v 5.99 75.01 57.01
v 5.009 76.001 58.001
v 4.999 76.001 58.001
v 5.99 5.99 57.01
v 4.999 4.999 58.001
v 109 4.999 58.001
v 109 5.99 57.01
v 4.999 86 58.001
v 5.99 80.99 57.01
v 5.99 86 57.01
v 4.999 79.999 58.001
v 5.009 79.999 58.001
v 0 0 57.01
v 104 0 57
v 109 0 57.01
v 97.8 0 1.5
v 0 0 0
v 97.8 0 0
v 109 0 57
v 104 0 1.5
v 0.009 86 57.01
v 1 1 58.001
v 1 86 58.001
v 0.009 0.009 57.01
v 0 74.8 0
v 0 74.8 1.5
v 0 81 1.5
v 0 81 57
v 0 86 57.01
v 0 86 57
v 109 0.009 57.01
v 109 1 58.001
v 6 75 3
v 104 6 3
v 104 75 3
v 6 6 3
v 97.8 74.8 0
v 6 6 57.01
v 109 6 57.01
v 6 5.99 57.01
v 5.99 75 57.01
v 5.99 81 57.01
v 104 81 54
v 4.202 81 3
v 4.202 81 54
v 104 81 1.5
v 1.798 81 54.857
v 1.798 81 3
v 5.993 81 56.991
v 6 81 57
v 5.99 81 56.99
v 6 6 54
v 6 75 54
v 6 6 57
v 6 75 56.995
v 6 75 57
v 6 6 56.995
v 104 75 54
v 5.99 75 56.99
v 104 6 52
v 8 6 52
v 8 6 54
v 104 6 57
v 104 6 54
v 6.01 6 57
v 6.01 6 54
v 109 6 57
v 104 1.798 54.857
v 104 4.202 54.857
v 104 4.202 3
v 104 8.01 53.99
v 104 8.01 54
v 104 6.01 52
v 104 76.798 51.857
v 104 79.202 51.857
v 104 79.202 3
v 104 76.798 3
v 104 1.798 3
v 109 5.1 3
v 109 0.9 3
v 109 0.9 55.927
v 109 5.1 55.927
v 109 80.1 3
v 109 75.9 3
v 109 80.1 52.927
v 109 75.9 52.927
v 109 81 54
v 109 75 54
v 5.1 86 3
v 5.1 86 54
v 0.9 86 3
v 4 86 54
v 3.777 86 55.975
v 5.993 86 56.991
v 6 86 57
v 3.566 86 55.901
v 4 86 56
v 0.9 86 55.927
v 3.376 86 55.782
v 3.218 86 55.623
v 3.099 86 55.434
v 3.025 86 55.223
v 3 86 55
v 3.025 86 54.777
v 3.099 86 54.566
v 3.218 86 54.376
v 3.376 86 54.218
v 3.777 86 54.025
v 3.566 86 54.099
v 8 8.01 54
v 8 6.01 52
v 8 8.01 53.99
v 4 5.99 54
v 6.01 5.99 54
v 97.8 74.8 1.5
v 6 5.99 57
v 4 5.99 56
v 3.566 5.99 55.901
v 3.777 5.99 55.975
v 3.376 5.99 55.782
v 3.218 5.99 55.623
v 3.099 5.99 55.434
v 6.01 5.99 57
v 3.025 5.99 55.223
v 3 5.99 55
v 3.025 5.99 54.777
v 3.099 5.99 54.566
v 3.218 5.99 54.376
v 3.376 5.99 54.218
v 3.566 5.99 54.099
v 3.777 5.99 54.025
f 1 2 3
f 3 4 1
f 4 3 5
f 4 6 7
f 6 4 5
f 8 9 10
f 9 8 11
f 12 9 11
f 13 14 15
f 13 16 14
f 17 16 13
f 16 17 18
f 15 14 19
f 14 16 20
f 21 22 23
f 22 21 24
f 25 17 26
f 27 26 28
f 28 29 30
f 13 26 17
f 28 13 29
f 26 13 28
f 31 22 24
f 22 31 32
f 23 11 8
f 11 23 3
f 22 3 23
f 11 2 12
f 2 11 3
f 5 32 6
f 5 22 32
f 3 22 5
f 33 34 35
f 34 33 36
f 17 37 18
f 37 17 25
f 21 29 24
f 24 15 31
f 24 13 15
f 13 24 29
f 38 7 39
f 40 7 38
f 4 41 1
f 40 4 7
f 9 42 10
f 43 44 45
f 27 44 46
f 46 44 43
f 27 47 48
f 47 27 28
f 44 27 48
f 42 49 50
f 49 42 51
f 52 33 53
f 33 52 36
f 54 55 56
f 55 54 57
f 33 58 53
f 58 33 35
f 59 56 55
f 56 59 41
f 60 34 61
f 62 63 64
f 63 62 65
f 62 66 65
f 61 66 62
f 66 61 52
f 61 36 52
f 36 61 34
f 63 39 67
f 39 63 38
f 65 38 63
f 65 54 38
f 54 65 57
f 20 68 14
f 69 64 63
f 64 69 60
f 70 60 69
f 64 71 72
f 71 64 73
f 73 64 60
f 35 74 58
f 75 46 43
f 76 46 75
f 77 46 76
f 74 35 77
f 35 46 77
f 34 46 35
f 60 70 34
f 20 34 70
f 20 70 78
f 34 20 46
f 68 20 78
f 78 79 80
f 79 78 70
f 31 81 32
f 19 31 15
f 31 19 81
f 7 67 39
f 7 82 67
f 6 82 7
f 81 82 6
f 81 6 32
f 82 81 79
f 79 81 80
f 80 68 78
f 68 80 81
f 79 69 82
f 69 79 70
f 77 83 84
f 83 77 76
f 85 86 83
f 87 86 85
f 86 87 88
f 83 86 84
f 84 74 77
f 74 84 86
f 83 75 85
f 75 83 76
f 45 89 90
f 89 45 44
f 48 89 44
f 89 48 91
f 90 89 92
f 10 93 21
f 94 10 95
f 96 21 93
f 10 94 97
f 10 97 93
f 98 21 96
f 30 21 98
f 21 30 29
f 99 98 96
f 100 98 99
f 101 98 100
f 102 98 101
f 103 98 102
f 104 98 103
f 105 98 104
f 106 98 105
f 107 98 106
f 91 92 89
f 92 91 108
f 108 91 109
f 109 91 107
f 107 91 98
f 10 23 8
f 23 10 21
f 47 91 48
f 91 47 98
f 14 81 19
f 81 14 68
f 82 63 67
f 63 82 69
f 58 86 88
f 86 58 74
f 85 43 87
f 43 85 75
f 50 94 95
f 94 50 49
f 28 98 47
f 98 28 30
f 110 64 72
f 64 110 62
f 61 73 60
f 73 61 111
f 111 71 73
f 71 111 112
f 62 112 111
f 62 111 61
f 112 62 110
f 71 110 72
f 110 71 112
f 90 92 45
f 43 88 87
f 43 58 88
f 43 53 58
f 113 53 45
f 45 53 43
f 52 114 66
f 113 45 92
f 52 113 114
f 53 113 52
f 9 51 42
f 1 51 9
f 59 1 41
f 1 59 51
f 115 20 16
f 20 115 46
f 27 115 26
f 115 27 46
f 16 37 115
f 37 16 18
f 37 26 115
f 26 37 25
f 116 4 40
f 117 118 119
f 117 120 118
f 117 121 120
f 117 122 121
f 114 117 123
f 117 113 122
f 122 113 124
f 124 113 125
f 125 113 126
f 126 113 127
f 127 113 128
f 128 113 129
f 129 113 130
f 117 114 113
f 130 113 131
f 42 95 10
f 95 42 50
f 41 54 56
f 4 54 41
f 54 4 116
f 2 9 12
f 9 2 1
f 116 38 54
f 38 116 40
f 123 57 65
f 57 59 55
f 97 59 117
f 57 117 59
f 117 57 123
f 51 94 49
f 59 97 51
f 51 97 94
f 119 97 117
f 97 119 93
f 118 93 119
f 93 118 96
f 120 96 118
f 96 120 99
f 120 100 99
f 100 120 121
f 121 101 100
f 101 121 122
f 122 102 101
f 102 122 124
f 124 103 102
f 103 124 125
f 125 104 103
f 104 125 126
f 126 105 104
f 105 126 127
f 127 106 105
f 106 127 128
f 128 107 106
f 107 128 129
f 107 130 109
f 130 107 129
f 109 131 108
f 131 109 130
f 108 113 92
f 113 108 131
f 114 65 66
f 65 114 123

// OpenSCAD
// ============================================================================
// cutlery_box.scad
// Graduated 3-chamber disposable-cutlery box (Option 3) — CUT-FROM-SOLID port
// of build_box.py, for a 120 x 120 x 120 mm printer (AOSEED).
//
// WHY THIS PORT EXISTS (the whole point):
//   The hand-mesh generator (build_box.py) could not keep the 1 mm rim chamfer
//   continuous across the female dovetail joints, because where a slot's flared
//   corner crosses the sloped chamfer it needs a true boolean intersection.
//   OpenSCAD HAS that boolean kernel, so here we do exactly the "cut-from-solid"
//   thing:
//      1. Build the ENTIRE box as ONE solid, WITH the chamfer already on it.
//      2. difference() out vertical dovetail prisms ( /_\ cross-section ),
//         running from just above the base plate up THROUGH the rim, to both
//         (a) form the sliding-dovetail joints, and
//         (b) split the box into 6 bed-sized pieces.
//   Because the cut is a real boolean through the already-chamfered solid, the
//   sloped chamfer<->slot edge is produced for free => the rim chamfer stays
//   CONTINUOUS across every joint, with none of the sliver hacks.
//
// ----------------------------------------------------------------------------
// HOW TO USE
//   In the app:  set `part` below (or use the Customizer dropdown), F5 to
//                preview, F6 to render, then File > Export > STL.
//   One piece (CLI):
//      openscad -o body_knife_A.stl -D 'part="knife_A"' cutlery_box.scad
//   ALL SIX (bash, run from this folder):
//      for p in knife_A knife_B fork_A fork_B spoon_A spoon_B; do \
//        openscad -o "body_$p.stl" -D "part=\"$p\"" cutlery_box.scad ; done
//   PNG preview of one piece:
//      openscad -o knife_B.png --imgsize=1400,1000 --autocenter --viewall \
//        -D 'part="knife_B"' cutlery_box.scad
//
//   Pieces are modelled in ASSEMBLED coordinates (floor-down, z=0 is the bed),
//   so importing all six STLs together shows the assembled box directly; your
//   slicer will auto-drop each one onto the plate for printing.
//
// BED SANITY: every piece is <= 120 mm in X, Y, Z.
//   Z = 58 mm. Widest piece = spoon at 117 mm (Y). A-halves reach 109 mm (X,
//   including the protruding dovetail key). All under 120.
//
// !! I could NOT run OpenSCAD to verify this file (no binary in my sandbox) !!
//   - The rim chamfer is a SMOOTH, true-45 bevel built from hull() frustums of
//     convex rectangles. Works in every OpenSCAD since ~2015 (incl. Homebrew
//     2021.01). No stepped staircase -- and, crucially, it makes box() a clean
//     well-formed solid so the per-part booleans resolve reliably (the old
//     14-slice staircase was fragile and CGAL was dropping the walls of the
//     interior parts, leaving only the key prisms => "floating boxes").
//   - roof() is still available behind USE_ROOF=true for those who have it
//     (2021.01+ snapshots); for THIS rectangular design it is identical, so it
//     is NOT required.
//   - After F6, check the console for "WARNING"/"not a valid 2-manifold".
//     If a tenon ever looks detached, bump EPS to 0.05.
// ============================================================================


/* [Part to render / export] */
part = "knife_A"; // [knife_A, knife_B, fork_A, fork_B, spoon_A, spoon_B, assembly]

/* [Chamfer method] */
// false = smooth hull() frustum bevel (default, any OpenSCAD); true = roof() (2021.01+)
USE_ROOF = false;

/* [Heights (mm)] */
BASE   = 3.0;     // floor / base-plate thickness
COMP_H = 55.0;    // interior wall height above the floor (cutlery stack depth)

/* [Walls (mm)] */
HOST_T   = 6.0;     // thickness of every wall (thick enough to host a dovetail)
HALF_LEN = 104.0;   // printed length of each half (A = near, B = far); <120 incl. key

/* [Chamber bays (mm)] */
N_COL     = 3;       // columns of cutlery per chamber
KNIFE_COL = 23.0;    // -> knife bay 69  (3 x 19 mm knives + play)
FORK_COL  = 33.0;    // -> fork  bay 99  (3 x 29 mm forks  + play)
SPOON_COL = 37.0;    // -> spoon bay 111 (3 x 34 mm spoons + play, trimmed <120)

/* [Dovetail joint (mm)] */
DT_DEPTH = 5.0;   // tail protrusion past the seam (male key depth)
DT_NECK  = 1.2;   // half-width at the seam face (narrow)
DT_FLARE = 2.1;   // half-width at the tip (wide -> locks)
DT_CLR   = 0.4;   // FLANK/seam slide clearance added to the female socket (do not change for fit)
DT_DEPTH_RELIEF = 0.3; // extra depth on the socket BACK only, so the tail tip never bottoms out

/* [Hidden-dovetail top cap / "hat" (mm)] */
// The dovetail otherwise shows its trapezoid outline on the TOP edge of the wall.
// To hide it, the MALE piece extends the wall's full-width top (chamfer included)
// across the key footprint -> a flush, continuous top. The FEMALE piece gets a
// matching top RECESS (cap footprint + CAP_CLR) so the cap drops straight in.
// Result: the top reads as one surface with a single straight seam line at the cap
// tip; the dovetail joinery lives entirely below the cap.
//
// SELF-SUPPORTING UNDERSIDE: the cap reaches the FULL wall width at the chamfer base
// (so the top edge reads as the wall extended, with NO recessed sliver on the outer
// face), and its underside is ONE planar ramp from the chamfer's OUTER CORNER
// (half-width HOST_T/2 at z = BODY_H-CHAMFER) down to the dovetail-neck half-width
// (CAP_FOOT) at CAP_SLANT_DEG from horizontal. No little horizontal step. The ramp
// reaching full width exactly at the chamfer base means "ramp top" == "chamfer base"
// (CAP_H is DERIVED). The FEMALE recess is the same ramp + CAP_CLR play.
// TRADEOFF: because the cap runs all the way to the outer corner, the female wall
// tapers to ~0 at z = BODY_H-CHAMFER -> a thin feather edge at the joint (gradual at
// CAP_SLANT_DEG, hidden inside the joint when assembled). Accepted per design intent.
CAP_SLANT_DEG = 50;     // cap underside ramp angle from horizontal (50 = self-supporting, long flare)
CAP_FOOT = DT_NECK;     // cap-underside half-width where it meets the dovetail neck
CAP_CLR = 0.3;          // slide clearance so the male cap seats into the female top recess

/* [Rim chamfer (mm)] */
CHAMFER = 1.0;    // 45-deg comfort break broken along the top wall edges

/* [Base half-lap / anti-warp (mm)] */
// Neighbouring base plates overlap as a HORIZONTAL half-lap (shiplap) at mid-base
// height, so corners stay coplanar (no lift/protrusion). Horizontal lap faces do
// NOT bind the vertical-drop assembly. Shingle direction: A->B and knife->fork->spoon.
LAP_LEN = 6;        // overlap past the A/B seam and the knife/fork seam
LAP_LEN_FS = 2;     // overlap past the fork/SPOON seam -- SMALLER: spoon is the
                    // tightest piece (117mm of the 120mm bed); a 6mm lap there
                    // would push spoon to 123mm. 2mm keeps spoon at 119mm.
LAP_Z   = BASE/2;   // 1.5 -- horizontal split height of the lap (bottom vs top half)
LAP_CLR = 0.2;      // in-plane clearance so the shelf isn't a press fit

/* [Lid — box features that receive a flat ORDERED clear sheet] */
// The lid itself is NOT printed: it's a flat ~2 mm PETG/Tritan sheet, bullnose-polished
// edges (r=LID_EDGE_R), ordered to size. We only model the box features that receive it.
LID_T            = 2.0;   // ordered sheet thickness
LID_EDGE_R       = 1.0;   // ordered sheet bullnose edge radius (for the sheet order spec)
LID_PLAY         = 0.4;   // total vertical play in the hinge groove (sheet + this)
LID_RECESS       = 2.0;   // lid TOP sits this far BELOW the rim, so the journal pocket is fully
                          // capped (rim caps the bullnose -> retains the lid when raised; tilt-in)
HINGE_AT_MINUS_X = true;  // hinge on the -x (303mm) end wall; clip on +x. (flip = mirror; default delivered)
// perimeter support ledge (lid underside rests on it at z = BODY_H-LID_T)
LEDGE_W          = 2.0;   // ledge inward protrusion (its underside ramps back at 45 deg -> self-supporting)
GROOVE_END_INSET = 0.0;   // groove reaches the corners but RUNS OUT smoothly there (no end-face / no
                          // exposed bore); GROOVE_TAPER sets the run-out length
GROOVE_TAPER     = 4.0;   // y-length over which the eased mouth tapers out at each groove end
// hinge journal (cut into the inner face of the hinge end wall, CONTINUOUS along the long edge)
GROOVE_DEPTH     = 3.0;   // 2mm lead-in slot + 1mm pocket radius -> journal sits 2mm back from the
                          // face so its cap clears the swing relief and RETAINS the lid
GROOVE_POCKET_R  = 1.0;   // journal half-cylinder radius (the bullnose sheet edge rolls in it)
// clip latch — TWO light DETENT clips on the clip end wall, flanking a central finger notch.
// "Light detent" = small overhang so the rigid sheet pops past it by hand (not a firm lock).
CLIP_W           = 8.0;   // width of EACH of the two clips
CLIP_LIP         = 0.3;   // retaining overhang (light detent; 0.3 soft .. 0.6 firm-but-stiff)
CLIP_RAMP_H      = 1.6;   // cam-ramp height (press-to-close lead-in)
// finger notch — a through-cut in the clip wall (visible from outside), centered between the
// two clips, so a fingertip can reach the lid edge and lift it (popping both clips at once).
NOTCH_W          = 20.0;  // finger-notch width
NOTCH_DEPTH      = 6.0;   // how far down from the rim (past the lid edge, to ~2mm below it)


/* [Hidden] */
EPS      = 0.01;          // tiny overlap so abutting solids fuse cleanly in CGAL
// Upper-chamber pieces (fork, spoon) were cut by a cell plane laid EXACTLY on the
// divider wall's far face (the lower chamber owns that wall). intersection() along a
// plane coincident with an existing box face makes CGAL leave a ZERO-THICKNESS copy
// of the wall face -> edge-manifold + "watertight" but degenerate (OpenSCAD shows it
// as a blue back-face; Tinkercad thickens it into a phantom block). SEAM_EPS nudges
// those cut planes a hair INTO the open bay so they no longer coincide with any box
// face -> no flap. 0.02 mm is physically nothing but is well clear of CGAL's tolerance.
SEAM_EPS = 0.02;
CUT_OVER = 1.0;           // how far dovetail cutters overshoot the rim (clean cut)

BODY_H    = BASE + COMP_H;     // 58  total height
END_WALL  = HOST_T;            // end walls are dovetail hosts too -> equally thick
TOTAL_LEN = 2 * HALF_LEN;      // 208 assembled length (end wall .. end wall)

// hidden-cap ramp geometry (derived).
//   CAP_HW    = cap MAX half-width = HOST_T/2 (the full wall edge) at the chamfer base.
//   CAP_RISE  = vertical height of the self-supporting CAP_SLANT_DEG underside ramp.
//   CAP_ZRAMP = where the cap reaches full width = the chamfer base (BODY_H-CHAMFER), so
//               the ramp runs straight to the chamfer OUTER CORNER (no horizontal step).
//   CAP_ZBOT  = cap bottom = ramp start; CAP_H derived from it (for reference/report).
//   CAP_ZRAMP_R = recess ramp top, shifted down by CAP_CLR so the recess ramp stays
//               parallel to the cap ramp with uniform play.
CAP_HW      = HOST_T/2;   // cap reaches the FULL wall edge at the chamfer base
CAP_RISE    = (CAP_HW - CAP_FOOT) * tan(CAP_SLANT_DEG);
CAP_ZRAMP   = BODY_H - CHAMFER;               // full width exactly at the chamfer base / outer corner
CAP_ZBOT    = CAP_ZRAMP - CAP_RISE;
CAP_H       = BODY_H - CAP_ZBOT;              // derived; reported
CAP_ZRAMP_R = CAP_ZRAMP;   // recess ramp ALSO tops at the chamfer corner (mirror the cap) -> no vertical lip
// sanity checks
assert(CAP_ZBOT > BASE + 1,
       "cap zone dips too low -- raise CAP_SLANT_DEG");
assert(CAP_HW >= DT_FLARE,
       "cap too narrow to cover the dovetail tail");

// NOTE: lid-derived constants are defined BELOW the Y-layout block, because some of
// them (INTERIOR_Y0/Y1, CLIP_CY) depend on OUTER_L / OUTER_R / EXT_W. See "lid derived".

// bay widths
KNIFE_BAY = N_COL * KNIFE_COL; // 69
FORK_BAY  = N_COL * FORK_COL;  // 99
SPOON_BAY = N_COL * SPOON_COL; // 111

// ---- Y layout (width direction): wall | bay | divider | bay | divider | bay | wall
KNIFE_Y0 = 0;
KNIFE_Y1 = HOST_T + KNIFE_BAY + HOST_T;        // 0..81   (outer wall + bay + divider)
FORK_Y0  = KNIFE_Y1;                           // 81
FORK_Y1  = FORK_Y0 + FORK_BAY + HOST_T;        // 81..186 (bay + divider)
SPOON_Y0 = FORK_Y1;                            // 186
SPOON_Y1 = SPOON_Y0 + SPOON_BAY + HOST_T;      // 186..303(bay + outer wall)
EXT_W    = SPOON_Y1;                           // 303 total width

// lengthwise wall Y-bands [y0,y1] (host the A/B dovetails) + their centers
OUTER_L  = [0, HOST_T];                                       // [0,6]    c=3
DIV_KF   = [HOST_T + KNIFE_BAY, HOST_T + KNIFE_BAY + HOST_T]; // [75,81]  c=78
DIV_FS   = [FORK_Y0 + FORK_BAY, FORK_Y0 + FORK_BAY + HOST_T]; // [180,186]c=183
OUTER_R  = [SPOON_Y1 - HOST_T, SPOON_Y1];                     // [297,303]c=300

// ---- lid derived ---- (placed AFTER OUTER_L/OUTER_R/EXT_W so nothing is forward-referenced)
LID_TOP_Z   = BODY_H - LID_RECESS;        // 56  lid TOP (recessed); rim z=58 rises LID_RECESS above it
LID_Z_UNDER = LID_TOP_Z - LID_T;          // 54  lid underside / ledge top / lowered-divider top
POCKET_CZ   = LID_TOP_Z - LID_T/2;        // 55  journal centre (lid mid) -> pocket top = LID_TOP_Z = capped
// hinge end-wall inner face x + inward direction; clip end-wall inner face x + inward dir
HINGE_INX   = HINGE_AT_MINUS_X ? END_WALL : TOTAL_LEN - END_WALL;       // 6  (default)
HINGE_IN    = HINGE_AT_MINUS_X ? 1 : -1;  // interior direction from the hinge wall (+x default)
CLIP_INX    = HINGE_AT_MINUS_X ? TOTAL_LEN - END_WALL : END_WALL;       // 202 (default)
CLIP_IN     = HINGE_AT_MINUS_X ? -1 : 1;  // interior direction from the clip wall (-x default)
POCKET_CX   = HINGE_INX - HINGE_IN*(GROOVE_DEPTH - GROOVE_POCKET_R);    // 5  pocket centre x (INTO the wall)
INTERIOR_Y0 = OUTER_L[1];                 // 6   inner face of the -y short wall
INTERIOR_Y1 = OUTER_R[0];                 // 297 inner face of the +y short wall
CLIP_CY     = EXT_W/2;                     // 151.5 clip/scallop centre (in the fork chamber)
assert(POCKET_CZ - GROOVE_POCKET_R > BASE + 1,
       "journal dips too low -- reduce LID_RECESS or LID_T");
assert(POCKET_CZ + GROOVE_POCKET_R <= LID_TOP_Z + EPS,
       "journal not capped -- lower the lid (raise LID_RECESS) or shrink GROOVE_POCKET_R");
// NOTE: with LID_RECESS the lid underside (and lowered dividers) sit BELOW CAP_ZBOT. That is
// intended: the inner dividers are cut flat below the cap zone (their hidden caps are removed,
// but the lid covers them); the perimeter/end-wall caps are untouched (full-height walls).

// the three OPEN bays are rectangular holes in the wall footprint:
//   footprint = outer rectangle MINUS these bays  (== the 6 walls; verified).
// The smooth chamfer is built from exactly this decomposition.
BAY_X0 = END_WALL;              // 6
BAY_X1 = TOTAL_LEN - END_WALL;  // 202
BAYS = [
    [BAY_X0, BAY_X1, HOST_T,   HOST_T + KNIFE_BAY],   // knife bay [6,202] x [6,75]
    [BAY_X0, BAY_X1, FORK_Y0,  FORK_Y0 + FORK_BAY],   // fork  bay [6,202] x [81,180]
    [BAY_X0, BAY_X1, SPOON_Y0, SPOON_Y0 + SPOON_BAY], // spoon bay [6,202] x [186,297]
];

YC_OUTL  = OUTER_L[0] + HOST_T/2;   // 3   outer-left wall center
YC_DIVKF = DIV_KF[0]  + HOST_T/2;   // 78  knife/fork divider center
YC_DIVFS = DIV_FS[0]  + HOST_T/2;   // 183 fork/spoon divider center
YC_OUTR  = OUTER_R[0] + HOST_T/2;   // 300 outer-right wall center

// seams
AB_SEAM = HALF_LEN;               // 104  A/B length seam (x)
SEAM_KF = FORK_Y0;                // 81   knife/fork width seam (y)
SEAM_FS = SPOON_Y0;              // 186  fork/spoon width seam (y)
ENDC_A  = END_WALL/2;             // 3    A end-wall center (x) -> chamber dovetails
ENDC_B  = TOTAL_LEN - END_WALL/2; // 205  B end-wall center (x)


// ============================================================================
// 2D wall footprint (cross-section of all walls, constant in z for the straight
// part). Union of: 2 full-width end walls + 4 lengthwise walls between them.
// ============================================================================
module wall_footprint_2d() {
    // footprint = outer rectangle minus the 3 open bays  (== the 6 walls)
    difference() {
        square([TOTAL_LEN, EXT_W]);
        for (b = BAYS) translate([b[0], b[2]]) square([b[1] - b[0], b[3] - b[2]]);
    }
}

// ============================================================================
// The full chamfered box solid = base plate + walls with a continuous 1 mm
// top-rim chamfer. Built ONCE; every piece is carved out of this.
// ============================================================================
module chamfer_cap() {
    // SMOOTH 45 rim chamfer over z[BODY_H-CHAMFER, BODY_H], in absolute coords.
    zm = BODY_H - CHAMFER;
    if (USE_ROOF) {
        // exact straight-skeleton roof, capped at CHAMFER height (needs roof()).
        intersection() {
            translate([0,0,zm]) roof() wall_footprint_2d();
            translate([0,0,zm]) linear_extrude(CHAMFER + EPS) wall_footprint_2d();
        }
    } else {
        // DEFAULT: true 45 bevel as hull() frustums of CONVEX rectangles -> smooth
        // AND a clean manifold.  Since footprint = outer - bays, the chamfer of the
        // footprint = (outer rectangle beveled inward) MINUS (each bay beveled so it
        // grows toward the top, which bevels every bay-facing rim).  All hull()s are
        // on convex rectangles, so nothing gets convex-filled.
        difference() {
            // outer perimeter frustum: full outer rect at zm -> inset by CHAMFER at top
            hull() {
                translate([0,0,zm])     linear_extrude(0.001) square([TOTAL_LEN, EXT_W]);
                translate([0,0,BODY_H]) linear_extrude(0.001) offset(delta=-CHAMFER) square([TOTAL_LEN, EXT_W]);
            }
            // each bay grows by CHAMFER toward the top -> bevels its surrounding rim.
            // (overshoots z a hair past both ends so the cut is clean.)
            for (b = BAYS)
                hull() {
                    translate([0,0,zm-EPS])     linear_extrude(0.001)
                        translate([b[0],b[2]]) offset(delta=-EPS)        square([b[1]-b[0], b[3]-b[2]]);
                    translate([0,0,BODY_H+EPS]) linear_extrude(0.001)
                        translate([b[0],b[2]]) offset(delta=CHAMFER+EPS) square([b[1]-b[0], b[3]-b[2]]);
                }
        }
    }
}

module box() {
    zm = BODY_H - CHAMFER;
    union() {
        cube([TOTAL_LEN, EXT_W, BASE]);                                        // base plate z[0,3]
        translate([0,0,BASE]) linear_extrude(zm - BASE + EPS) wall_footprint_2d(); // straight walls z[3,57]
        chamfer_cap();                                                         // smooth chamfer z[57,58]
    }
}

// ============================================================================
// Dovetail prisms ( /_\ ). Vertical, z[BASE, BODY_H+CUT_OVER] so they cut
// through the rim but leave the base plate continuous. The near face is pushed
// back EPS so a male key always fuses to its wall.
//   male key   : half_n=DT_NECK,         half_f=DT_FLARE
//   female slot: half_n=DT_NECK+DT_CLR,  half_f=DT_FLARE+DT_CLR
// ============================================================================
module dt_prism_X(seam_x, yc, half_n, half_f) {   // perpendicular to X, grows +X
    translate([0,0,BASE]) linear_extrude(BODY_H - BASE + CUT_OVER)
        polygon([[seam_x - EPS,        yc - half_n],
                 [seam_x + DT_DEPTH,   yc - half_f],
                 [seam_x + DT_DEPTH,   yc + half_f],
                 [seam_x - EPS,        yc + half_n]]);
}
module dt_prism_Y(seam_y, xc, half_n, half_f) {   // perpendicular to Y, grows +Y
    translate([0,0,BASE]) linear_extrude(BODY_H - BASE + CUT_OVER)
        polygon([[xc - half_n, seam_y - EPS],
                 [xc - half_f, seam_y + DT_DEPTH],
                 [xc + half_f, seam_y + DT_DEPTH],
                 [xc + half_n, seam_y - EPS]]);
}
module ab_key   (yc)        { dt_prism_X(AB_SEAM, yc, DT_NECK, DT_FLARE); }
module ch_key   (seam_y, xc){ dt_prism_Y(seam_y, xc, DT_NECK, DT_FLARE); }

// Female sockets = male + DT_CLR on the flanks/seam (unchanged), PLUS a straight
// back-face relief of DT_DEPTH_RELIEF so the tail tip never bottoms out. The
// relief is a rectangle tacked onto the trapezoid's tip at the SAME flare width,
// so the angled flank faces (and their 0.4 mm slide clearance) are untouched.
module ab_socket(yc) {
    dt_prism_X(AB_SEAM, yc, DT_NECK + DT_CLR, DT_FLARE + DT_CLR);
    translate([0,0,BASE]) linear_extrude(BODY_H - BASE + CUT_OVER)
        translate([AB_SEAM + DT_DEPTH, yc - (DT_FLARE + DT_CLR)])
            square([DT_DEPTH_RELIEF, 2*(DT_FLARE + DT_CLR)]);          // back relief, +X
}
module ch_socket(seam_y, xc) {
    dt_prism_Y(seam_y, xc, DT_NECK + DT_CLR, DT_FLARE + DT_CLR);
    translate([0,0,BASE]) linear_extrude(BODY_H - BASE + CUT_OVER)
        translate([xc - (DT_FLARE + DT_CLR), seam_y + DT_DEPTH])
            square([2*(DT_FLARE + DT_CLR), DT_DEPTH_RELIEF]);          // back relief, +Y
}

// ===== hidden-dovetail top cap ("hat"), SELF-SUPPORTING underside ===============
// MALE cap: a FULL-wall-width hat whose underside is ONE planar ramp from the chamfer's
// OUTER CORNER (half-width CAP_HW = HOST_T/2 at CAP_ZRAMP = BODY_H-CHAMFER) down to the
// dovetail-neck half-width (CAP_FOOT) at CAP_SLANT_DEG from horizontal -> the self-
// supporting shoulder, running straight to the corner (no horizontal step). Built as
// hull(narrow bottom slab buried in the tail neck, full-width top slab through the rim);
// box() trims it to the wall and adds the continuous rim chamfer for free, so the outer
// top edge reads as the wall extended (no recessed sliver). The protruding NOSE is left
// SQUARE (vertical) -- hidden in the female socket when assembled.
// TRADEOFF: the female wall tapers to ~0 at z=BODY_H-CHAMFER (a thin feather edge at the
// joint, gradual at CAP_SLANT_DEG) -- accepted per design intent.
module ab_cap(yc) {   // A/B seam, grows +X past the seam (length direction)
    hull() {
        translate([AB_SEAM - EPS, yc - CAP_FOOT, CAP_ZBOT])
            cube([DT_DEPTH + EPS, 2*CAP_FOOT, EPS]);
        translate([AB_SEAM - EPS, yc - CAP_HW,   CAP_ZRAMP])
            cube([DT_DEPTH + EPS, 2*CAP_HW, (BODY_H + CUT_OVER) - CAP_ZRAMP]);
    }
}
module ch_cap(seam_y, xc) {   // chamber seam, grows +Y past the seam (in the end wall)
    hull() {
        translate([xc - CAP_FOOT, seam_y - EPS, CAP_ZBOT])
            cube([2*CAP_FOOT, DT_DEPTH + EPS, EPS]);
        translate([xc - CAP_HW,   seam_y - EPS, CAP_ZRAMP])
            cube([2*CAP_HW, DT_DEPTH + EPS, (BODY_H + CUT_OVER) - CAP_ZRAMP]);
    }
}
// FEMALE recess: the SAME ramp grown by CAP_CLR (flanks, tip, floor, and ramp shifted down
// by CAP_CLR so it stays parallel) -> the cap seats with uniform slide clearance. It opens
// to the wall edge (and a hair past, into air) so the cap's full-width corner drops in;
// this is what leaves the thin female feather at the top (accepted). Open upward + toward seam.
module ab_cap_neg(yc) {
    hull() {
        translate([AB_SEAM - EPS, yc - (CAP_FOOT + CAP_CLR), CAP_ZBOT - CAP_CLR])
            cube([DT_DEPTH + CAP_CLR + EPS, 2*(CAP_FOOT + CAP_CLR), EPS]);
        translate([AB_SEAM - EPS, yc - (CAP_HW + EPS), CAP_ZRAMP_R])
            cube([DT_DEPTH + CAP_CLR + EPS, 2*(CAP_HW + EPS), (BODY_H + CUT_OVER + 1) - CAP_ZRAMP_R]);
    }
}
module ch_cap_neg(seam_y, xc) {
    hull() {
        translate([xc - (CAP_FOOT + CAP_CLR), seam_y - EPS, CAP_ZBOT - CAP_CLR])
            cube([2*(CAP_FOOT + CAP_CLR), DT_DEPTH + CAP_CLR + EPS, EPS]);
        translate([xc - (CAP_HW + EPS), seam_y - EPS, CAP_ZRAMP_R])
            cube([2*(CAP_HW + EPS), DT_DEPTH + CAP_CLR + EPS, (BODY_H + CUT_OVER + 1) - CAP_ZRAMP_R]);
    }
}
// LOWERED-DIVIDER hat: same 50-deg self-supporting cap as ab_cap, but reaching FULL width at the
// LOWERED divider top (LID_Z_UNDER) instead of the rim -- because the inner dividers are lowered
// for the lid, which strips their normal cap. It extends above the top and is trimmed flush to
// LID_Z_UNDER by divider_lower(), so the divider top reads as one surface (dovetail hidden below).
DCAP_ZRAMP = LID_Z_UNDER;            // full width at the lowered divider top (54)
DCAP_ZBOT  = DCAP_ZRAMP - CAP_RISE;  // ramp start (neck), 50 deg below
module div_cap(yc) {        // male hat on the lowered divider (A/B seam)
    hull() {
        translate([AB_SEAM - EPS, yc - CAP_FOOT, DCAP_ZBOT])
            cube([DT_DEPTH + EPS, 2*CAP_FOOT, EPS]);
        translate([AB_SEAM - EPS, yc - CAP_HW,   DCAP_ZRAMP])
            cube([DT_DEPTH + EPS, 2*CAP_HW, (BODY_H + CUT_OVER) - DCAP_ZRAMP]);
    }
}
module div_cap_neg(yc) {    // female recess to receive div_cap (with CAP_CLR slide play)
    hull() {
        translate([AB_SEAM - EPS, yc - (CAP_FOOT + CAP_CLR), DCAP_ZBOT - CAP_CLR])
            cube([DT_DEPTH + CAP_CLR + EPS, 2*(CAP_FOOT + CAP_CLR), EPS]);
        translate([AB_SEAM - EPS, yc - (CAP_HW + EPS), DCAP_ZRAMP])
            cube([DT_DEPTH + CAP_CLR + EPS, 2*(CAP_HW + EPS), (BODY_H + CUT_OVER + 1) - DCAP_ZRAMP]);
    }
}

// rectangular cell (x[xa,xb], y[ya,yb], full height + margin) used to split pieces
module cell(xa, xb, ya, yb) {
    translate([xa, ya, -1]) cube([xb - xa, yb - ya, BODY_H + 11]);
}

// ===== base half-lap (shiplap) =================================================
// HORIZONTAL lap at mid-base height: the shelf-owner keeps its BOTTOM half
// (z 0..LAP_Z) extending LAP_LEN past the seam; the neighbour has its bottom half
// REMOVED there (keeps only the top half) and lands flat on the shelf. Horizontal
// faces => no binding during the vertical drop. Shelves live entirely in the base
// (z < BASE), well clear of the wall dovetails (z >= BASE).
// Shingle = FEMALE-first (matches the no-notch dovetail assembly order, which
// lowers the male piece onto the female): the B half owns the A/B shelf (grows
// -X into A) and the UPPER chamber (fork, spoon) owns the chamber shelf (grows
// -Y into the lower chamber).  Order: spoon, fork, knife; B before A.
module lap_shelf_X(y0, y1) {                 // B-side shelf, grows -X into A past AB_SEAM
    // +EPS past AB_SEAM so the shelf interpenetrates (not just abuts) its own B body -> fuses cleanly.
    translate([AB_SEAM - LAP_LEN, y0, 0]) cube([LAP_LEN + EPS, y1 - y0, LAP_Z]);
}
module lap_neg_X(y0, y1) {                   // A-side: remove bottom half to receive it
    translate([AB_SEAM - LAP_LEN - LAP_CLR, y0 - EPS, -EPS])
        cube([LAP_LEN + LAP_CLR + EPS, (y1 - y0) + 2*EPS, LAP_Z + EPS]);
}
module lap_shelf_Y(seam_y, x0, x1, ln=LAP_LEN) {   // upper-chamber shelf, grows -Y into lower
    // grows -Y by `ln` into the lower chamber AND +Y by 2*SEAM_EPS past the seam so it
    // always overlaps the (SEAM_EPS-nudged) body floor and stays fused -> no floating shelf.
    translate([x0, seam_y - ln, 0]) cube([x1 - x0, ln + 2*SEAM_EPS, LAP_Z]);
}
module lap_neg_Y(seam_y, x0, x1, ln=LAP_LEN) {     // lower-chamber: remove bottom half
    translate([x0 - EPS, seam_y - ln - LAP_CLR, -EPS])
        cube([(x1 - x0) + 2*EPS, ln + LAP_CLR + EPS, LAP_Z + EPS]);
}

// ============================================================================
// LID FEATURES (receive a flat ORDERED clear sheet; the sheet is not printed).
// All features live at the TOP (z >= ~52), ABOVE the dovetail engagement, the half-lap
// (z<1.5) and most of the hat, so the vertical-drop assembly and joints are untouched.
// EPS overlaps throughout; no coincident coplanar faces with the existing walls.
// Default orientation: HINGE on the -x end wall (A pieces), CLIP on the +x end wall
// (B pieces), clip+scallop centred on the fork (middle) chamber.
// ============================================================================

// --- perimeter support ledge: 45-deg self-supporting brackets; rest face at LID_Z_UNDER.
//     Runs along the CLIP end wall + the two short outer walls. (Hinge wall uses the groove.)
//     Built as hull(thin top edge, wall column) -> a triangular bracket whose underside is
//     a 45-deg ramp (prints floor-down with no support). ADDED to each piece (clipped by cell).
//     Each run is INSET by LEDGE_W from the perpendicular walls so the three brackets never
//     overlap at a corner and the wall's normal chamfer wraps every corner uninterrupted.
module lid_ledge() {
    cy0 = INTERIOR_Y0 + LEDGE_W;  cy1 = INTERIOR_Y1 - LEDGE_W;  cyl = cy1 - cy0;   // clip-run y span (inset)
    sx0 = END_WALL    + LEDGE_W;  sxl = (TOTAL_LEN - 2*END_WALL) - 2*LEDGE_W;       // short-run x span (inset)
    // clip end wall (x = CLIP_INX), bracket protrudes toward interior (CLIP_IN)
    hull() {
        translate([CLIP_INX + CLIP_IN*LEDGE_W, cy0, LID_Z_UNDER - EPS]) cube([EPS, cyl, EPS]);
        translate([CLIP_INX - EPS,             cy0, LID_Z_UNDER - LEDGE_W]) cube([2*EPS, cyl, LEDGE_W]);
    }
    // OUTER_L short wall (y = INTERIOR_Y0), bracket protrudes +y
    hull() {
        translate([sx0, INTERIOR_Y0 + LEDGE_W, LID_Z_UNDER - EPS]) cube([sxl, EPS, EPS]);
        translate([sx0, INTERIOR_Y0 - EPS,     LID_Z_UNDER - LEDGE_W]) cube([sxl, 2*EPS, LEDGE_W]);
    }
    // OUTER_R short wall (y = INTERIOR_Y1), bracket protrudes -y
    hull() {
        translate([sx0, INTERIOR_Y1 - LEDGE_W, LID_Z_UNDER - EPS]) cube([sxl, EPS, EPS]);
        translate([sx0, INTERIOR_Y1 - EPS,     LID_Z_UNDER - LEDGE_W]) cube([sxl, 2*EPS, LEDGE_W]);
    }
}

// --- hinge groove: ONE 2D cross-section (journal bore + lead-in slot + 45-deg swing ramp),
//     CAPPED at the recessed lid top (LID_TOP_Z), swept along the wall. At BOTH ends the whole
//     profile RUNS OUT smoothly -- it tapers to the inner-top rim corner (HINGE_INX, BODY_H) --
//     so there is NO end-face and NO exposed bore at the corners; the groove just fades into the
//     wall. The rim caps the bullnose (retains the lid, tilt-in); the 45-deg ramp is self-
//     supporting and gives the swing clearance; the cap stays full over the bullnose => retains.
module groove_profile() {                            // 2D cross-section in (x, z)
    union() {
        translate([POCKET_CX, POCKET_CZ]) circle(r = GROOVE_POCKET_R, $fn = 28);              // journal bore
        translate([POCKET_CX, LID_Z_UNDER]) square([HINGE_INX - POCKET_CX + EPS, LID_T]);     // lead-in slot
        polygon([[POCKET_CX, LID_TOP_Z], [HINGE_INX + EPS, LID_TOP_Z], [HINGE_INX + EPS, BODY_H - CHAMFER]]); // swing relief (below the rim chamfer)
        polygon([[HINGE_INX, BODY_H - CHAMFER], [HINGE_INX + EPS, BODY_H + EPS], [HINGE_INX - CHAMFER, BODY_H + EPS]]); // rim chamfer cut, CONTINUOUS through the divider junctions (no bulge)
    }
}
module groove_extrude(y0, y1) {                      // sweep the profile along the wall, y0..y1
    translate([0, y0, 0]) rotate([90,0,0]) translate([0,0,-(y1 - y0)]) linear_extrude(y1 - y0) groove_profile();
}
module hinge_groove() {
    // journal runs STRAIGHT to the end of the wall at each side; the perpendicular short wall
    // caps the bore there (no run-out). The EPS overlap tucks the bore end into the short wall.
    groove_extrude(INTERIOR_Y0 - EPS, INTERIOR_Y1 + EPS);
}

// --- lower the inner chamber dividers to the lid underside (mid-support, no sag).
//     Removes the divider top over the full length; outer walls keep full height.
module divider_lower() {
    // x-span is the CHAMBER BAY only [BAY_X0, BAY_X1] (+EPS overlap into the end walls so the
    // cut is manifold). The end/outer walls keep their full BODY_H tops; only the two INNER
    // dividers (DIV_KF, DIV_FS) are lowered.
    translate([BAY_X0 - EPS, DIV_KF[0], LID_Z_UNDER]) cube([BAY_X1 - BAY_X0 + 2*EPS, HOST_T, BODY_H - LID_Z_UNDER + CUT_OVER]);
    translate([BAY_X0 - EPS, DIV_FS[0], LID_Z_UNDER]) cube([BAY_X1 - BAY_X0 + 2*EPS, HOST_T, BODY_H - LID_Z_UNDER + CUT_OVER]);
}

// --- retaining clips (ADDED): TWO light detent lips on the clip end wall, flanking the finger
//     notch. Each lip overhangs the RECESSED lid top (LID_TOP_Z) by CLIP_LIP and gives a soft
//     hold; a lead-in ramp above it cams the lid under on close. Anchored into the wall. Light
//     enough that lifting the lid edge (through the notch) flexes the sheet past both at once.
CLIP_OFF = NOTCH_W/2 + CLIP_W/2;     // clip centre offset from CLIP_CY (clips sit just outside the notch)
module one_clip(yc) {
    translate([0, yc - CLIP_W/2, 0]) rotate([90,0,0]) translate([0,0,-CLIP_W]) linear_extrude(CLIP_W)
        polygon([[CLIP_INX - CLIP_IN*HOST_T/2, LID_TOP_Z - 0.8],         // anchor low, into the wall (fuse)
                 [CLIP_INX + CLIP_IN*CLIP_LIP, LID_TOP_Z],               // lip tip: overhang over the lid top
                 [CLIP_INX + CLIP_IN*CLIP_LIP, LID_TOP_Z + 0.4],         // lip front
                 [CLIP_INX - CLIP_IN*HOST_T/2, LID_TOP_Z + CLIP_RAMP_H]]);// lead-in ramp up into the wall
}
module lid_clip() {
    one_clip(CLIP_CY - CLIP_OFF);
    one_clip(CLIP_CY + CLIP_OFF);
}

// --- finger notch (CUT): a through-cut in the clip end wall, centred between the two clips,
//     from the rim down ~NOTCH_DEPTH (past the lid edge). Goes THROUGH the wall so it reads as
//     a visible scoop from the outside and a fingertip can reach the lid edge to lift it.
module lid_finger_notch() {
    translate([CLIP_INX - EPS, CLIP_CY - NOTCH_W/2, BODY_H - NOTCH_DEPTH])
        cube([END_WALL + 2*EPS, NOTCH_W, NOTCH_DEPTH + EPS]);
}

// --- restore the inner-top rim chamfer where the LOWERED dividers meet the +x (clip) end wall.
//     The box chamfer is interrupted at those junctions (the divider fills the inner side before
//     it is lowered), leaving a full-height bulge once lowered. The -x/hinge side is already
//     handled by the continuous journal chamfer; this does the same at the +x end.
module div_chamfer_fix() {
    cz = BODY_H - CHAMFER;            // 57, chamfer base
    xf = TOTAL_LEN - END_WALL;        // 202, +x clip-wall inner face
    for (yb = [DIV_KF, DIV_FS])
        translate([0, yb[0] - EPS, 0]) rotate([90,0,0]) translate([0,0,-((yb[1]-yb[0])+2*EPS)]) linear_extrude((yb[1]-yb[0])+2*EPS)
            polygon([[xf, cz], [xf - EPS, BODY_H + EPS], [xf + CHAMFER, BODY_H + EPS]]);  // bevel toward the wall (x>202)
}

// ============================================================================
// The six pieces.  piece = intersection(box, cell + own male keys) - own sockets
//   A halves are MALE on the A/B seam (keep the key); B halves are FEMALE (slot).
//   On a chamber seam the LEFT chamber is male (+Y), the right chamber is female.
// ============================================================================
// Base half-lap shingling (FEMALE-first, Option 1):
//   A/B seam  -> the B half owns the bottom shelf (grows -X), A has the negative.
//   chamber   -> the UPPER chamber (fork, spoon) owns the shelf (grows -Y); the
//                lower chamber (knife, fork) has the negative.
//   Assembly order: spoon, fork, knife; B before A (male lowered onto female).
// Center crossings (104,81)&(104,186): the CHAMBER shelf (fork_A / spoon_A) owns the
//   crossing square; the B-half A/B shelf (knife_B / fork_B) is CLIPPED short of the
//   chamber seam by LAP_LEN so two shelves never collide.
module knife_A() {                                       // placed LAST; receives everything
    difference() {
        union() {
            intersection() {
                box();
                union() {
                    cell(-1, AB_SEAM, KNIFE_Y0 - 1, KNIFE_Y1);
                    ab_key(YC_OUTL); ab_key(YC_DIVKF); ch_key(SEAM_KF, ENDC_A);
                    ab_cap(YC_OUTL); div_cap(YC_DIVKF); ch_cap(SEAM_KF, ENDC_A);  // hide tops (divider uses LOWERED hat)
                }
            }
            intersection() { lid_ledge(); cell(-1, AB_SEAM, KNIFE_Y0 - 1, KNIFE_Y1); }  // lid support ledge
        }
        lap_neg_X(KNIFE_Y0, KNIFE_Y1);            // receive knife_B's A/B shelf
        lap_neg_Y(SEAM_KF, 0, AB_SEAM);           // receive fork_A's chamber shelf
        hinge_groove(); divider_lower(); lid_finger_notch(); div_chamfer_fix();   // lid cuts (groove hits A pieces; divider/scallop where present)
    }
}

module knife_B() {
    difference() {
        union() {
            intersection() {
                box();
                union() {
                    cell(AB_SEAM, TOTAL_LEN + 1, KNIFE_Y0 - 1, KNIFE_Y1);
                    ch_key(SEAM_KF, ENDC_B);
                    ch_cap(SEAM_KF, ENDC_B);                // hide top (male, chamber)
                }
            }
            lap_shelf_X(KNIFE_Y0, KNIFE_Y1 - LAP_LEN);  // A/B shelf -> knife_A (CLIPPED at y=81 crossing)
            intersection() { lid_ledge(); cell(AB_SEAM, TOTAL_LEN + 1, KNIFE_Y0 - 1, KNIFE_Y1); }  // lid support ledge
        }
        ab_socket(YC_OUTL); ab_socket(YC_DIVKF);
        ab_cap_neg(YC_OUTL); div_cap_neg(YC_DIVKF);      // top recesses to receive knife_A's caps (divider = LOWERED hat)
        lap_neg_Y(SEAM_KF, AB_SEAM, TOTAL_LEN);         // receive fork_B's chamber shelf
        hinge_groove(); divider_lower(); lid_finger_notch(); div_chamfer_fix();   // lid cuts
    }
}

module fork_A() {
    difference() {
        union() {
            intersection() {
                box();
                union() {
                    cell(-1, AB_SEAM, FORK_Y0 + SEAM_EPS, FORK_Y1);  // -Y cut nudged off the divider face
                    ab_key(YC_DIVFS); ch_key(SEAM_FS, ENDC_A);
                    div_cap(YC_DIVFS); ch_cap(SEAM_FS, ENDC_A);       // hide tops (divider uses LOWERED hat)
                }
            }
            lap_shelf_Y(SEAM_KF, 0, AB_SEAM);           // chamber shelf -> knife_A (owns crossing)
            intersection() { lid_ledge(); cell(-1, AB_SEAM, FORK_Y0 + SEAM_EPS, FORK_Y1); }  // lid support ledge (none in fork-A)
        }
        lap_neg_X(FORK_Y0, FORK_Y1);                    // receive fork_B's A/B shelf
        ch_socket(SEAM_KF, ENDC_A);
        ch_cap_neg(SEAM_KF, ENDC_A);                    // top recess to receive knife_A's chamber cap (female)
        lap_neg_Y(SEAM_FS, 0, AB_SEAM, LAP_LEN_FS);     // receive spoon_A's (small) chamber shelf
        hinge_groove(); divider_lower(); lid_finger_notch(); div_chamfer_fix();   // lid cuts (groove = fork-A hinge segment; divider = DIV_FS)
    }
}

module fork_B() {
    union() {
        difference() {
            union() {
                intersection() {
                    box();
                    union() {
                        cell(AB_SEAM, TOTAL_LEN + 1, FORK_Y0 + SEAM_EPS, FORK_Y1);  // -Y cut nudged off the divider face
                        ch_key(SEAM_FS, ENDC_B);
                        ch_cap(SEAM_FS, ENDC_B);                // hide top (male, chamber)
                    }
                }
                lap_shelf_X(FORK_Y0, FORK_Y1 - LAP_LEN_FS); // A/B shelf -> fork_A (CLIPPED at y=186 crossing)
                lap_shelf_Y(SEAM_KF, AB_SEAM, TOTAL_LEN);   // chamber shelf -> knife_B
                intersection() { lid_ledge(); cell(AB_SEAM, TOTAL_LEN + 1, FORK_Y0 + SEAM_EPS, FORK_Y1); }  // lid ledge (clip-end run)
            }
            ab_socket(YC_DIVFS);
            div_cap_neg(YC_DIVFS);                           // top recess to receive fork_A's A/B cap (divider = LOWERED hat)
            ch_socket(SEAM_KF, ENDC_B);
            ch_cap_neg(SEAM_KF, ENDC_B);                    // top recess to receive knife_B's chamber cap (female)
            lap_neg_Y(SEAM_FS, AB_SEAM, TOTAL_LEN, LAP_LEN_FS); // receive spoon_B's (small) chamber shelf
            hinge_groove(); divider_lower(); lid_finger_notch(); div_chamfer_fix();     // lid cuts (scallop lands here)
        }
        intersection() { lid_clip(); cell(AB_SEAM, TOTAL_LEN + 1, FORK_Y0 + SEAM_EPS, FORK_Y1); }  // retaining clip, added AFTER the scallop cut
    }
}

module spoon_A() {
    difference() {
        union() {
            intersection() {
                box();
                union() {
                    cell(-1, AB_SEAM, SPOON_Y0 + SEAM_EPS, SPOON_Y1 + 1);  // -Y cut nudged off the divider face
                    ab_key(YC_OUTR);
                    ab_cap(YC_OUTR);                        // hide top (male)
                }
            }
            lap_shelf_Y(SEAM_FS, 0, AB_SEAM, LAP_LEN_FS); // chamber shelf -> fork_A (small; owns crossing)
            intersection() { lid_ledge(); cell(-1, AB_SEAM, SPOON_Y0 + SEAM_EPS, SPOON_Y1 + 1); }  // lid support ledge (OUTER_R run)
        }
        lap_neg_X(SPOON_Y0, SPOON_Y1);                  // receive spoon_B's A/B shelf
        ch_socket(SEAM_FS, ENDC_A);
        ch_cap_neg(SEAM_FS, ENDC_A);                    // top recess to receive fork_A's chamber cap (female)
        hinge_groove(); divider_lower(); lid_finger_notch(); div_chamfer_fix();   // lid cuts (groove = spoon-A hinge segment)
    }
}

module spoon_B() {                                      // placed FIRST; owns shelves
    difference() {
        union() {
            intersection() {
                box();
                union() {
                    cell(AB_SEAM, TOTAL_LEN + 1, SPOON_Y0 + SEAM_EPS, SPOON_Y1 + 1);  // -Y cut nudged off the divider face
                }
            }
            lap_shelf_X(SPOON_Y0, SPOON_Y1);            // A/B shelf -> spoon_A
            lap_shelf_Y(SEAM_FS, AB_SEAM, TOTAL_LEN, LAP_LEN_FS); // chamber shelf -> fork_B (small)
            intersection() { lid_ledge(); cell(AB_SEAM, TOTAL_LEN + 1, SPOON_Y0 + SEAM_EPS, SPOON_Y1 + 1); }  // lid ledge (OUTER_R + clip-end runs)
        }
        ab_socket(YC_OUTR);
        ab_cap_neg(YC_OUTR);                            // top recess to receive spoon_A's A/B cap (female)
        ch_socket(SEAM_FS, ENDC_B);
        ch_cap_neg(SEAM_FS, ENDC_B);                    // top recess to receive fork_B's chamber cap (female)
        hinge_groove(); divider_lower(); lid_finger_notch(); div_chamfer_fix();   // lid cuts
    }
}

// TRUE assembled view: the six real, separable pieces in their assembled positions
// (slower to render — many booleans — but this is what actually shows the seams, the
// lowered dividers, the hinge journal, the clip, the scallop, and all the joints).
// For a fast no-cuts preview of just the outer shell, temporarily use box(); instead.
module assembly() {
    knife_A(); knife_B(); fork_A(); fork_B(); spoon_A(); spoon_B();
}

// ============================================================================
// Render dispatch
// ============================================================================
if      (part == "knife_A")  knife_A();
else if (part == "knife_B")  knife_B();
else if (part == "fork_A")   fork_A();
else if (part == "fork_B")   fork_B();
else if (part == "spoon_A")  spoon_A();
else if (part == "spoon_B")  spoon_B();
else if (part == "assembly") assembly();
else echo(str("Unknown part: ", part));
